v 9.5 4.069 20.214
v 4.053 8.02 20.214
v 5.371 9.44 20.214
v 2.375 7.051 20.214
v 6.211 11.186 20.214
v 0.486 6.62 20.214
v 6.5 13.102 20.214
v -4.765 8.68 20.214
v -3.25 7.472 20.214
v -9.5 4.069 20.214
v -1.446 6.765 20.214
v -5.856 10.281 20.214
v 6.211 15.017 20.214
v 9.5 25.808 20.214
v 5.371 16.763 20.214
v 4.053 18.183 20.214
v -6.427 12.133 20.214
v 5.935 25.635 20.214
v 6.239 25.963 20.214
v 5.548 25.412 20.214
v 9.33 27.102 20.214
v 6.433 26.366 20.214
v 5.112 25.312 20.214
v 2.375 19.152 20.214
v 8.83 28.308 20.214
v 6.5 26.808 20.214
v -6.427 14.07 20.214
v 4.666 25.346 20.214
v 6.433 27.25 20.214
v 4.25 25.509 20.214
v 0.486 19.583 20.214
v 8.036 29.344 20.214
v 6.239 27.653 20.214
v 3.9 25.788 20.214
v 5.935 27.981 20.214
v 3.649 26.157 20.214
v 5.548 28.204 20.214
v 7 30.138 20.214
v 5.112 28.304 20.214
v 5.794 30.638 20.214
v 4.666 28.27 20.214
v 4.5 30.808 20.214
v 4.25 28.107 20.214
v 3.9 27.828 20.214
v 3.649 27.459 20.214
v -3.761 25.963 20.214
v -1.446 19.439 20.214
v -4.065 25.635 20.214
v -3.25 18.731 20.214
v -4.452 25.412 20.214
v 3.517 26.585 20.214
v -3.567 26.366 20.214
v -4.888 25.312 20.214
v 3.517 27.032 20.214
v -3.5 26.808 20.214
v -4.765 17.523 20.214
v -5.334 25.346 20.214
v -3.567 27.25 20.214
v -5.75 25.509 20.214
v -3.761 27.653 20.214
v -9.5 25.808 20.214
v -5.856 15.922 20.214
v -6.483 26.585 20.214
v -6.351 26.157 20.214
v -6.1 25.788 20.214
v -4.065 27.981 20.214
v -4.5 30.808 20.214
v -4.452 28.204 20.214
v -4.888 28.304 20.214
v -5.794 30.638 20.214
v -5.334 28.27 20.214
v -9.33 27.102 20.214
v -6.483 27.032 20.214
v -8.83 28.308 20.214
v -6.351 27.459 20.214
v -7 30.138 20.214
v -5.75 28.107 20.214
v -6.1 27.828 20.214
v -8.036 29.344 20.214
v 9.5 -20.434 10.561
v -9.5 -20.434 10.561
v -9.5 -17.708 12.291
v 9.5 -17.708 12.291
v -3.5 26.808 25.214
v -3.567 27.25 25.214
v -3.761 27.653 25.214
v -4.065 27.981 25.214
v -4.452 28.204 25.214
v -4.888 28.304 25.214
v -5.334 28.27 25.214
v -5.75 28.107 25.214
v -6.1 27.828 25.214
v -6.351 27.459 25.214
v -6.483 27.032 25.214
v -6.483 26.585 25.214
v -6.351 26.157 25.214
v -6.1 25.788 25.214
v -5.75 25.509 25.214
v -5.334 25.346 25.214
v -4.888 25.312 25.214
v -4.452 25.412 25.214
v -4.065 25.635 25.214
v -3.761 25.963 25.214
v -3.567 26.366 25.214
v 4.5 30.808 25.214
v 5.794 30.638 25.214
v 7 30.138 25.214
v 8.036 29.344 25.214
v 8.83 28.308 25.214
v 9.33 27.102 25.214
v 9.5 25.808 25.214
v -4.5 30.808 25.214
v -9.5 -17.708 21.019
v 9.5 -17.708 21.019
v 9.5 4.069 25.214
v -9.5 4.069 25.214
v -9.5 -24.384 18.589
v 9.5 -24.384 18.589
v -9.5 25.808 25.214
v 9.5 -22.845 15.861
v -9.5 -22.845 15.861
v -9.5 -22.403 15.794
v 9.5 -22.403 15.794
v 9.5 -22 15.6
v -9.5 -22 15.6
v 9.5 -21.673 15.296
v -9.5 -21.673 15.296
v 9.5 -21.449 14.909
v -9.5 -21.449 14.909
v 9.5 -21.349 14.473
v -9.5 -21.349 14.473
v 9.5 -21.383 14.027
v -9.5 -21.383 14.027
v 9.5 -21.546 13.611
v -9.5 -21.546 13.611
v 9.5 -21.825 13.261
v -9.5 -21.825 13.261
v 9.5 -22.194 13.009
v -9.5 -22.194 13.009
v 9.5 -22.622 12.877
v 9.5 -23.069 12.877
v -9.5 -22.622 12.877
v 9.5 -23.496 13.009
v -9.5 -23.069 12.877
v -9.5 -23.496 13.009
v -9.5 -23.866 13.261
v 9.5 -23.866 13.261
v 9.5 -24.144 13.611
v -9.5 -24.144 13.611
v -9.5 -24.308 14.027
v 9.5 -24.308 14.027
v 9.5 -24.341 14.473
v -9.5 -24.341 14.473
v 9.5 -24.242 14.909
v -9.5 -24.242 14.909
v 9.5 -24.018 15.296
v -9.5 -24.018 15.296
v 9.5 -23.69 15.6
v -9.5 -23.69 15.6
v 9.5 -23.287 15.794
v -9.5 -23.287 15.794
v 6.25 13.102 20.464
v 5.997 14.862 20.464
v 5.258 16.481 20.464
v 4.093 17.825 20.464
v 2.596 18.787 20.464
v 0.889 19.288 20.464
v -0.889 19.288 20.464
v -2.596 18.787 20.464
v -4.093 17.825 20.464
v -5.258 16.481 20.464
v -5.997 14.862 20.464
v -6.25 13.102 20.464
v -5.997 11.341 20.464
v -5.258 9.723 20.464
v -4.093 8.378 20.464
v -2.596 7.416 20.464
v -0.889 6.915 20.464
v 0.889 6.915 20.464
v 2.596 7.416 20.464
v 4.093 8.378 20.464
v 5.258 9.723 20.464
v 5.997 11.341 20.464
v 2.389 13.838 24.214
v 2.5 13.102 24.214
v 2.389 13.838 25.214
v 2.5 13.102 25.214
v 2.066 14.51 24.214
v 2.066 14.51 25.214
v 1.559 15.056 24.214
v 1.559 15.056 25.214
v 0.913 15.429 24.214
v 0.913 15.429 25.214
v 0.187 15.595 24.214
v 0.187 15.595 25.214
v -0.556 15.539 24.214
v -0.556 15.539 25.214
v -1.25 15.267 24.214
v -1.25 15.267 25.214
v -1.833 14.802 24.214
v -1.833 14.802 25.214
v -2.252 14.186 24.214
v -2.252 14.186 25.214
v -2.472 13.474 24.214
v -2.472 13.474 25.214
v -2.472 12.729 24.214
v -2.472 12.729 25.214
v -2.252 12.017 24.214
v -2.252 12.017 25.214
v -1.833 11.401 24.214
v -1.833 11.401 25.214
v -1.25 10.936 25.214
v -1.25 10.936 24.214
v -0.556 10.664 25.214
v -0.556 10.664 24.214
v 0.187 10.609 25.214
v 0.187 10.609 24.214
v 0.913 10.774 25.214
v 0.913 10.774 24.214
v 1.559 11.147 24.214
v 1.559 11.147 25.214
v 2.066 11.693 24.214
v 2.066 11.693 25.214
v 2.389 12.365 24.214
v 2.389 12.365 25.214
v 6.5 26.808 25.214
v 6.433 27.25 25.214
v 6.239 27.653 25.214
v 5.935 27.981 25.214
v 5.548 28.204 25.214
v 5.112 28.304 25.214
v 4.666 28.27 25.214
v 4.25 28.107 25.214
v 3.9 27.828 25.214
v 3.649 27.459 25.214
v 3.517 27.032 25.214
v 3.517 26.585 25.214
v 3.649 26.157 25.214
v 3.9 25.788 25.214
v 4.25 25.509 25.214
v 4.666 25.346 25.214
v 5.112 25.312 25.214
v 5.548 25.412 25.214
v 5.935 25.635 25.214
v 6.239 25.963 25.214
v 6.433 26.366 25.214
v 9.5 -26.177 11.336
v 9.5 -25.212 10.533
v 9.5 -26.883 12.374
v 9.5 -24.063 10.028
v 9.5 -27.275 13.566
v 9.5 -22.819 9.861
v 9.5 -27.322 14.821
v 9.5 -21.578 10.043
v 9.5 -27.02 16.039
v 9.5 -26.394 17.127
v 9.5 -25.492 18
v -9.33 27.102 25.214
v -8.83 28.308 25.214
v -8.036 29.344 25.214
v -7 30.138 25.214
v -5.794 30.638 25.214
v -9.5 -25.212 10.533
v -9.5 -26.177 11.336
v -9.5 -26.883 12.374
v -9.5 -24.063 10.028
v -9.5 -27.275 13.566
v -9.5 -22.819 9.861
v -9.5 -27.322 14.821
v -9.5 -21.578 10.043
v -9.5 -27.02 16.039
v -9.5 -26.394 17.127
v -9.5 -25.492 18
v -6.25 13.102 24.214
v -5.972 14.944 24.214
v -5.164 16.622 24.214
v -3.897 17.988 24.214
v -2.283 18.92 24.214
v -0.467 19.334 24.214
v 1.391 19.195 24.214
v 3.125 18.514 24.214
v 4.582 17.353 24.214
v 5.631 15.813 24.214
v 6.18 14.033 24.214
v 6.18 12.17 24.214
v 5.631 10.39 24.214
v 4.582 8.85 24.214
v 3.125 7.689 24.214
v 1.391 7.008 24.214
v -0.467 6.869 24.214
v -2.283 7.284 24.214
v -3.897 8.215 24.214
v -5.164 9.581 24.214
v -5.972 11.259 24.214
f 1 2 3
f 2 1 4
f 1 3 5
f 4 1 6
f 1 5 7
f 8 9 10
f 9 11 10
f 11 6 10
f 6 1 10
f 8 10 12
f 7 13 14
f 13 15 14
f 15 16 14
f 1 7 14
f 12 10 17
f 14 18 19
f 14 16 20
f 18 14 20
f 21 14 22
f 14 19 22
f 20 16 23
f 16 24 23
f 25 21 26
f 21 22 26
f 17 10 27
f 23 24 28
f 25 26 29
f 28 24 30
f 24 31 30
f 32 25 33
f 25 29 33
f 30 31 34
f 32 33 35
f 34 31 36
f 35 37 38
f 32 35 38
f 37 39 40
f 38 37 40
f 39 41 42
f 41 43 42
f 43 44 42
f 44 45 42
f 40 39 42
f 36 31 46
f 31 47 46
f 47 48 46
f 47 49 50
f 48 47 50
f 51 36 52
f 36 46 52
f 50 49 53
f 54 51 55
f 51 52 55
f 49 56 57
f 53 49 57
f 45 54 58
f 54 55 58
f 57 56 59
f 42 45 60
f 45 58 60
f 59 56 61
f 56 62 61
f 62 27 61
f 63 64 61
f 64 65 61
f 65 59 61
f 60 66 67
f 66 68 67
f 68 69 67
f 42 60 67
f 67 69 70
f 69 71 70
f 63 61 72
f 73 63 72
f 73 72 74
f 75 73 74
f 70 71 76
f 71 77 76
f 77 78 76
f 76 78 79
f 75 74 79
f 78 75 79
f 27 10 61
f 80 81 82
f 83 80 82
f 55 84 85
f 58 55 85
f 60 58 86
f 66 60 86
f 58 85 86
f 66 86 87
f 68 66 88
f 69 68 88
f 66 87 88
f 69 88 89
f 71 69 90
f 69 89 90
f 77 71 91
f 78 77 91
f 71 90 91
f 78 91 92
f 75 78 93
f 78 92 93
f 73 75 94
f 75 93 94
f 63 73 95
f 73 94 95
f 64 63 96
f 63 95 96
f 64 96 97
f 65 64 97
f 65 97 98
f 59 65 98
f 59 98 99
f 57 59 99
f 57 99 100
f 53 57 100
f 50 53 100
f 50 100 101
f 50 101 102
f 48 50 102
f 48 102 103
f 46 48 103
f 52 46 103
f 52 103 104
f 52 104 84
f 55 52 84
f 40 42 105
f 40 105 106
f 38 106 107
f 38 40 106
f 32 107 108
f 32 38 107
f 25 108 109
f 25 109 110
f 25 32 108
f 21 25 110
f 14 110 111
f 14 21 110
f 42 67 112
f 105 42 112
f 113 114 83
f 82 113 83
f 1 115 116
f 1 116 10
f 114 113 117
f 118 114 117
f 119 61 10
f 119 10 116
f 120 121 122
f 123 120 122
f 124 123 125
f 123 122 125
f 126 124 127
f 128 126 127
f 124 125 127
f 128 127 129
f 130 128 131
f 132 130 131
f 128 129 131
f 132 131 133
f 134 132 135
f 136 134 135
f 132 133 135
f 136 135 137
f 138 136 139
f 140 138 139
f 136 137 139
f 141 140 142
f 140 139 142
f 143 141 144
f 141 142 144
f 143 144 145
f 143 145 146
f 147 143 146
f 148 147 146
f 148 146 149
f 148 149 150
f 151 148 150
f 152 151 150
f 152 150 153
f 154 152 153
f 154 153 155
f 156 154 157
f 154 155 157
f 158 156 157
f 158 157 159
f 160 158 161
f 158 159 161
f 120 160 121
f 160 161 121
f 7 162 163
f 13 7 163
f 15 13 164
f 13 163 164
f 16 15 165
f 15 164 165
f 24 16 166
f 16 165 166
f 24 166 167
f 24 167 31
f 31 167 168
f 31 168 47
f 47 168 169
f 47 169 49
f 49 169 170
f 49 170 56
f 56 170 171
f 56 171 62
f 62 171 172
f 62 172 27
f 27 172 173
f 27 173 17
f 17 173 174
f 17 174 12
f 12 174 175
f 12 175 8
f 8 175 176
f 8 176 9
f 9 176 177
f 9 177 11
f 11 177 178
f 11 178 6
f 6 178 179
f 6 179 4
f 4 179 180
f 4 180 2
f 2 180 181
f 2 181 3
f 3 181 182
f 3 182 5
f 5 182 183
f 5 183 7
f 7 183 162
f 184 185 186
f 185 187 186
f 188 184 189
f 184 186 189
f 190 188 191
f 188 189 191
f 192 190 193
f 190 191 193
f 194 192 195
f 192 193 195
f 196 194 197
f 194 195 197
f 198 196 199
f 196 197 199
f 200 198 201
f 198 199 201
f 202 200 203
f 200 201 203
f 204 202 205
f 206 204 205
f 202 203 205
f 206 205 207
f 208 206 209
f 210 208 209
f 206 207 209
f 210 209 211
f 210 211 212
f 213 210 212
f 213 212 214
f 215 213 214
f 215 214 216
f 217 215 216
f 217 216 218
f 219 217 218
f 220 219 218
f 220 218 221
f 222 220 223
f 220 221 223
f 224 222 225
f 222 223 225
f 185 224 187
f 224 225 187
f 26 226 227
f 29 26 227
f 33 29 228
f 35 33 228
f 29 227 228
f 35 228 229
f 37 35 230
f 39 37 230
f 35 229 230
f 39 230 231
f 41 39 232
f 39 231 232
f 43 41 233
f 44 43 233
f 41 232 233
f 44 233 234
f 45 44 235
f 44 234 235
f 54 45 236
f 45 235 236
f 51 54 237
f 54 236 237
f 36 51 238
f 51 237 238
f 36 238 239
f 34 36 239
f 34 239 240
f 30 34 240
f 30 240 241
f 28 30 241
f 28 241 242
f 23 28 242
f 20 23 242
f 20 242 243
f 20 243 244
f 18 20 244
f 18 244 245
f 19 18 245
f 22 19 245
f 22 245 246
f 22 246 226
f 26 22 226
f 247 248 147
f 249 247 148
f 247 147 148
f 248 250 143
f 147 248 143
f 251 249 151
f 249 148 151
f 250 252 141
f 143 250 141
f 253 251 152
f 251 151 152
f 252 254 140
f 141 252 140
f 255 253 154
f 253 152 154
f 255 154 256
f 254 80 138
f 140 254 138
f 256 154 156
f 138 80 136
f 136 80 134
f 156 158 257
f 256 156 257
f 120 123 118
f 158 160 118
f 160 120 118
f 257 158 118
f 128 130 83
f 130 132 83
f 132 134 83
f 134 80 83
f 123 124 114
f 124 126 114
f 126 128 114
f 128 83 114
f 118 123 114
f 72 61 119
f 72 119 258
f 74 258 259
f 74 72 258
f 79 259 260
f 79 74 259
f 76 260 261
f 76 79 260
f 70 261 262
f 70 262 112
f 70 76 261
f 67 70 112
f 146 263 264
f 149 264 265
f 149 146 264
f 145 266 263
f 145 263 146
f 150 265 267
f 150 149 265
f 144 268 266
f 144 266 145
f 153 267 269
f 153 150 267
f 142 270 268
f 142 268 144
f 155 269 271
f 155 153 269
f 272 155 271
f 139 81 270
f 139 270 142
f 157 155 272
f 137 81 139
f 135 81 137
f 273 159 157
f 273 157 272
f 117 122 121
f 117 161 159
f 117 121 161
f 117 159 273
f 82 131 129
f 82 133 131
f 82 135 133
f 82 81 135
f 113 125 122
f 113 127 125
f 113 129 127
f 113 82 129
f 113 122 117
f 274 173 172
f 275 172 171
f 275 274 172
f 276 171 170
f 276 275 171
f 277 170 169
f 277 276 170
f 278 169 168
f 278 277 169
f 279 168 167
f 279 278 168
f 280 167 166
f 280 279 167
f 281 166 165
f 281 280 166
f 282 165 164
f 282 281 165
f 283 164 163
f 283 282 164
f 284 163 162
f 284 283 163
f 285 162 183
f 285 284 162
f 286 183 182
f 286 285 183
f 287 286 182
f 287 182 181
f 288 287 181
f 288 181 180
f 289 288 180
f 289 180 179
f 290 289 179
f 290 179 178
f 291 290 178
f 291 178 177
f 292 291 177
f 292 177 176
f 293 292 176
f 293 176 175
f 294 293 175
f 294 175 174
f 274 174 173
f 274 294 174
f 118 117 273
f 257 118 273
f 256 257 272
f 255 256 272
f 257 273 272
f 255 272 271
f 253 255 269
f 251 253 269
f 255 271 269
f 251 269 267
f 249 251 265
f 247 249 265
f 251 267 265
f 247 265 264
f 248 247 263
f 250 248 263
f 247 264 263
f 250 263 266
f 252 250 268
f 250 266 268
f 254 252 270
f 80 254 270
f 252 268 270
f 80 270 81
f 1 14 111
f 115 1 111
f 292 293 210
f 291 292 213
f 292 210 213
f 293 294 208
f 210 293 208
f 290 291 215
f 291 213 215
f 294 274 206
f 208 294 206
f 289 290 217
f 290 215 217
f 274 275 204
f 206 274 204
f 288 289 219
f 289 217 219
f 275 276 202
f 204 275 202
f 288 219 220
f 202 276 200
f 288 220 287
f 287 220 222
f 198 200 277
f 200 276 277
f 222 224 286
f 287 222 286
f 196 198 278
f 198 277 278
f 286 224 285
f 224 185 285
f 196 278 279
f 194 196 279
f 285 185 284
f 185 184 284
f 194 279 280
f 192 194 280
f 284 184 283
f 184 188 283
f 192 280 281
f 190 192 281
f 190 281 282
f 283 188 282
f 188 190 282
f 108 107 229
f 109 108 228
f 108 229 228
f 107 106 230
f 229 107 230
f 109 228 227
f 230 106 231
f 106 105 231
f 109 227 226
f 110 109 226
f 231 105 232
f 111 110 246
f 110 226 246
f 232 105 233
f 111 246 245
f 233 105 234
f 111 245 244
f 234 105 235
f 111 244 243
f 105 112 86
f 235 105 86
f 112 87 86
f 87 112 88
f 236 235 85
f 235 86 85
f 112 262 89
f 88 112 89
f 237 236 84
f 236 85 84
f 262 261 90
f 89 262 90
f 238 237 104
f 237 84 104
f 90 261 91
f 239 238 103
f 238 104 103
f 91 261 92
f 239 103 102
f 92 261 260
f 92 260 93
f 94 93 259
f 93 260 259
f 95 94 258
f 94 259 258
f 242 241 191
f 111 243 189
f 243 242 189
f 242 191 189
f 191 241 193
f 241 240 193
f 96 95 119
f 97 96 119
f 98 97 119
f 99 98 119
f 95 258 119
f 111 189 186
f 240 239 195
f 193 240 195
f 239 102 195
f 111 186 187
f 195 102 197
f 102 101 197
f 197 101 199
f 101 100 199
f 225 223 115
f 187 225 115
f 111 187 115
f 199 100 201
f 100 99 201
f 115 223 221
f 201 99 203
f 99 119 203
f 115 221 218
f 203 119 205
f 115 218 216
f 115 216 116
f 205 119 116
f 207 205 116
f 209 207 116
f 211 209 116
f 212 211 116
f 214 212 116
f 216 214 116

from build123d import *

# Parameters (mm, degrees)
BOSS_EXTRUDE1_START       = -0.8
BOSS_EXTRUDE1_OUTLINE_R   = 6
BOSS_EXTRUDE1_OUTLINE_R_2 = 2.5
BOSS_EXTRUDE1_DEPTH       = 1
BOSS_EXTRUDE1_START_2     = -9.5
BOSS_EXTRUDE1_2_OUTLINE_R = 2.75
BOSS_EXTRUDE1_2_DEPTH     = 19
BOSS_EXTRUDE1_START_3     = 20.214309477
BOSS_EXTRUDE1_3_OUTLINE_R = 1.25
BOSS_EXTRUDE1_3_DEPTH     = 5
SKETCH2_R                 = 6.25
CUT_EXTRUDE1_DEPTH        = 36.290497761
SKETCH3_R                 = 1.5
CUT_EXTRUDE2_DEPTH        = 10
SKETCH4_R                 = 2.75
SKETCH4_R_2               = 1.5
BOSS_EXTRUDE2_DEPTH       = 19
SKETCH5_W                 = 19.788266816
SKETCH5_H                 = 21.776938083
CUT_EXTRUDE3_DEPTH        = 45.112349032


with BuildPart() as part:
    # Boss-Extrude1: read off the stored shape, not the designer's step
    # Boss-Extrude1 outline → Boss-Extrude1 (new body)
    with BuildSketch(Plane(origin=(0, 0, 24.414309477), x_dir=(-1, 0, 0), z_dir=(0, 0, -1)).offset(BOSS_EXTRUDE1_START)):
        with Locations((0, 13.101553709)):
            Circle(BOSS_EXTRUDE1_OUTLINE_R)
        with Locations((0, 13.101553709)):
            Circle(BOSS_EXTRUDE1_OUTLINE_R_2, mode=Mode.SUBTRACT)
    extrude(amount=BOSS_EXTRUDE1_DEPTH)

    # Boss-Extrude1 2 outline → Boss-Extrude1 2 (add)
    with BuildSketch(Plane.YZ.offset(BOSS_EXTRUDE1_START_2)):
        with BuildLine():
            Line((30.808082296, 25.214309477), (-4.594884555, 25.214309477))
            ThreePointArc((-4.594884555, 25.214309477), (-6.157718154, 25.077579254), (-7.673065845, 24.671543064))
            Line((-7.673065845, 24.671543064), (-24.384342131, 18.58913592))
            ThreePointArc((-24.384342131, 18.58913592), (-26.882991431, 12.373899853), (-20.43432651, 10.560855883))
            Line((-20.43432651, 10.560855883), (-7.673065845, 18.658005573))
            ThreePointArc((-7.673065845, 18.658005573), (-5.104992299, 19.817354852), (-2.315454789, 20.214309477))
            Line((-2.315454789, 20.214309477), (30.808082296, 20.214309477))
            Line((30.808082296, 20.214309477), (30.808082296, 25.214309477))
        make_face()
        with Locations((-22.845251486, 14.360519126)):
            Circle(BOSS_EXTRUDE1_2_OUTLINE_R, mode=Mode.SUBTRACT)
    extrude(amount=BOSS_EXTRUDE1_2_DEPTH)

    # Boss-Extrude1 3 outline → Boss-Extrude1 3 (cut)
    with BuildSketch(Plane.XY.offset(BOSS_EXTRUDE1_START_3)):
        with BuildLine():
            ThreePointArc((-9.5, 25.808082296), (-8.035533906, 29.343616202), (-4.5, 30.808082296))
            Line((-4.5, 30.808082296), (-9.5, 30.808082296))
            Line((-9.5, 30.808082296), (-9.5, 25.808082296))
        make_face()
        with BuildLine():
            Line((9.5, 30.808082296), (4.5, 30.808082296))
            ThreePointArc((4.5, 30.808082296), (8.035533906, 29.343616202), (9.5, 25.808082296))
            Line((9.5, 25.808082296), (9.5, 30.808082296))
        make_face()
        with Locations((5, 26.808082296)):
            Circle(BOSS_EXTRUDE1_3_OUTLINE_R)
        with Locations((-5, 26.808082296)):
            Circle(BOSS_EXTRUDE1_3_OUTLINE_R)
    extrude(amount=BOSS_EXTRUDE1_3_DEPTH, mode=Mode.SUBTRACT)

    # Boss-Extrude1 4 outline → Boss-Extrude1 4 (revolve, cut)
    with BuildSketch(Plane.XZ.offset(-13.101553709)):
        Polygon((6, 20.714309477), (6, 24.214309477), (2.5, 24.214309477), (2.5, 25.214309477), (0, 25.214309477), (0, 20.214309477), (6.5, 20.214309477), align=None)
    revolve(axis=Axis((0, 13.101553709, 0), (0, 0, 1)), mode=Mode.SUBTRACT)

    # Sketch2 → Cut-Extrude1 (cut, through all)
    with BuildSketch(Plane(origin=(0, 0, 24.214309477), x_dir=(-1, 0, 0), z_dir=(0, 0, -1))):
        with Locations((0, 13.101553709)):
            Circle(SKETCH2_R)
    extrude(amount=CUT_EXTRUDE1_DEPTH, mode=Mode.SUBTRACT)

    # Sketch3 → Cut-Extrude2 (cut)
    with BuildSketch(Plane.XY.offset(25.214309477)):
        with Locations((-5, 26.808082296)):
            Circle(SKETCH3_R)
        with Locations((5, 26.808082296)):
            Circle(SKETCH3_R)
    extrude(amount=-CUT_EXTRUDE2_DEPTH, mode=Mode.SUBTRACT)

    # Sketch4 → Boss-Extrude2 (add)
    with BuildSketch(Plane.ZY.offset(9.5)):
        with Locations((14.360519126, -22.845251486)):
            Circle(SKETCH4_R)
        with Locations((14.360519126, -22.845251486)):
            Circle(SKETCH4_R_2, mode=Mode.SUBTRACT)
    extrude(amount=-BOSS_EXTRUDE2_DEPTH)

    # Sketch5 → Cut-Extrude3 (cut, through all)
    with BuildSketch(Plane(origin=(9.5, 0, 0), x_dir=(0, 0, -1), z_dir=(1, 0, 0))):
        with Locations((-19.035879135, -6.819131606)):
            Rectangle(SKETCH5_W, SKETCH5_H)
    extrude(amount=-CUT_EXTRUDE3_DEPTH, mode=Mode.SUBTRACT)


with BuildPart() as cut_extrude3_piece_1:
    # of the separate pieces the step leaves, piece 1, a body of its own (cut_extrude3_pieces)
    add(part.part.solids().sort_by_distance((-9.5, 25.808082296, 25.214309477))[0])


with BuildPart() as cut_extrude3_piece_2:
    # of the separate pieces the step leaves, piece 2, a body of its own (cut_extrude3_pieces)
    add(part.part.solids().sort_by_distance((-9.5, -20.43432651, 10.560855883))[0])


solid = Compound([cut_extrude3_piece_1.part, cut_extrude3_piece_2.part])
